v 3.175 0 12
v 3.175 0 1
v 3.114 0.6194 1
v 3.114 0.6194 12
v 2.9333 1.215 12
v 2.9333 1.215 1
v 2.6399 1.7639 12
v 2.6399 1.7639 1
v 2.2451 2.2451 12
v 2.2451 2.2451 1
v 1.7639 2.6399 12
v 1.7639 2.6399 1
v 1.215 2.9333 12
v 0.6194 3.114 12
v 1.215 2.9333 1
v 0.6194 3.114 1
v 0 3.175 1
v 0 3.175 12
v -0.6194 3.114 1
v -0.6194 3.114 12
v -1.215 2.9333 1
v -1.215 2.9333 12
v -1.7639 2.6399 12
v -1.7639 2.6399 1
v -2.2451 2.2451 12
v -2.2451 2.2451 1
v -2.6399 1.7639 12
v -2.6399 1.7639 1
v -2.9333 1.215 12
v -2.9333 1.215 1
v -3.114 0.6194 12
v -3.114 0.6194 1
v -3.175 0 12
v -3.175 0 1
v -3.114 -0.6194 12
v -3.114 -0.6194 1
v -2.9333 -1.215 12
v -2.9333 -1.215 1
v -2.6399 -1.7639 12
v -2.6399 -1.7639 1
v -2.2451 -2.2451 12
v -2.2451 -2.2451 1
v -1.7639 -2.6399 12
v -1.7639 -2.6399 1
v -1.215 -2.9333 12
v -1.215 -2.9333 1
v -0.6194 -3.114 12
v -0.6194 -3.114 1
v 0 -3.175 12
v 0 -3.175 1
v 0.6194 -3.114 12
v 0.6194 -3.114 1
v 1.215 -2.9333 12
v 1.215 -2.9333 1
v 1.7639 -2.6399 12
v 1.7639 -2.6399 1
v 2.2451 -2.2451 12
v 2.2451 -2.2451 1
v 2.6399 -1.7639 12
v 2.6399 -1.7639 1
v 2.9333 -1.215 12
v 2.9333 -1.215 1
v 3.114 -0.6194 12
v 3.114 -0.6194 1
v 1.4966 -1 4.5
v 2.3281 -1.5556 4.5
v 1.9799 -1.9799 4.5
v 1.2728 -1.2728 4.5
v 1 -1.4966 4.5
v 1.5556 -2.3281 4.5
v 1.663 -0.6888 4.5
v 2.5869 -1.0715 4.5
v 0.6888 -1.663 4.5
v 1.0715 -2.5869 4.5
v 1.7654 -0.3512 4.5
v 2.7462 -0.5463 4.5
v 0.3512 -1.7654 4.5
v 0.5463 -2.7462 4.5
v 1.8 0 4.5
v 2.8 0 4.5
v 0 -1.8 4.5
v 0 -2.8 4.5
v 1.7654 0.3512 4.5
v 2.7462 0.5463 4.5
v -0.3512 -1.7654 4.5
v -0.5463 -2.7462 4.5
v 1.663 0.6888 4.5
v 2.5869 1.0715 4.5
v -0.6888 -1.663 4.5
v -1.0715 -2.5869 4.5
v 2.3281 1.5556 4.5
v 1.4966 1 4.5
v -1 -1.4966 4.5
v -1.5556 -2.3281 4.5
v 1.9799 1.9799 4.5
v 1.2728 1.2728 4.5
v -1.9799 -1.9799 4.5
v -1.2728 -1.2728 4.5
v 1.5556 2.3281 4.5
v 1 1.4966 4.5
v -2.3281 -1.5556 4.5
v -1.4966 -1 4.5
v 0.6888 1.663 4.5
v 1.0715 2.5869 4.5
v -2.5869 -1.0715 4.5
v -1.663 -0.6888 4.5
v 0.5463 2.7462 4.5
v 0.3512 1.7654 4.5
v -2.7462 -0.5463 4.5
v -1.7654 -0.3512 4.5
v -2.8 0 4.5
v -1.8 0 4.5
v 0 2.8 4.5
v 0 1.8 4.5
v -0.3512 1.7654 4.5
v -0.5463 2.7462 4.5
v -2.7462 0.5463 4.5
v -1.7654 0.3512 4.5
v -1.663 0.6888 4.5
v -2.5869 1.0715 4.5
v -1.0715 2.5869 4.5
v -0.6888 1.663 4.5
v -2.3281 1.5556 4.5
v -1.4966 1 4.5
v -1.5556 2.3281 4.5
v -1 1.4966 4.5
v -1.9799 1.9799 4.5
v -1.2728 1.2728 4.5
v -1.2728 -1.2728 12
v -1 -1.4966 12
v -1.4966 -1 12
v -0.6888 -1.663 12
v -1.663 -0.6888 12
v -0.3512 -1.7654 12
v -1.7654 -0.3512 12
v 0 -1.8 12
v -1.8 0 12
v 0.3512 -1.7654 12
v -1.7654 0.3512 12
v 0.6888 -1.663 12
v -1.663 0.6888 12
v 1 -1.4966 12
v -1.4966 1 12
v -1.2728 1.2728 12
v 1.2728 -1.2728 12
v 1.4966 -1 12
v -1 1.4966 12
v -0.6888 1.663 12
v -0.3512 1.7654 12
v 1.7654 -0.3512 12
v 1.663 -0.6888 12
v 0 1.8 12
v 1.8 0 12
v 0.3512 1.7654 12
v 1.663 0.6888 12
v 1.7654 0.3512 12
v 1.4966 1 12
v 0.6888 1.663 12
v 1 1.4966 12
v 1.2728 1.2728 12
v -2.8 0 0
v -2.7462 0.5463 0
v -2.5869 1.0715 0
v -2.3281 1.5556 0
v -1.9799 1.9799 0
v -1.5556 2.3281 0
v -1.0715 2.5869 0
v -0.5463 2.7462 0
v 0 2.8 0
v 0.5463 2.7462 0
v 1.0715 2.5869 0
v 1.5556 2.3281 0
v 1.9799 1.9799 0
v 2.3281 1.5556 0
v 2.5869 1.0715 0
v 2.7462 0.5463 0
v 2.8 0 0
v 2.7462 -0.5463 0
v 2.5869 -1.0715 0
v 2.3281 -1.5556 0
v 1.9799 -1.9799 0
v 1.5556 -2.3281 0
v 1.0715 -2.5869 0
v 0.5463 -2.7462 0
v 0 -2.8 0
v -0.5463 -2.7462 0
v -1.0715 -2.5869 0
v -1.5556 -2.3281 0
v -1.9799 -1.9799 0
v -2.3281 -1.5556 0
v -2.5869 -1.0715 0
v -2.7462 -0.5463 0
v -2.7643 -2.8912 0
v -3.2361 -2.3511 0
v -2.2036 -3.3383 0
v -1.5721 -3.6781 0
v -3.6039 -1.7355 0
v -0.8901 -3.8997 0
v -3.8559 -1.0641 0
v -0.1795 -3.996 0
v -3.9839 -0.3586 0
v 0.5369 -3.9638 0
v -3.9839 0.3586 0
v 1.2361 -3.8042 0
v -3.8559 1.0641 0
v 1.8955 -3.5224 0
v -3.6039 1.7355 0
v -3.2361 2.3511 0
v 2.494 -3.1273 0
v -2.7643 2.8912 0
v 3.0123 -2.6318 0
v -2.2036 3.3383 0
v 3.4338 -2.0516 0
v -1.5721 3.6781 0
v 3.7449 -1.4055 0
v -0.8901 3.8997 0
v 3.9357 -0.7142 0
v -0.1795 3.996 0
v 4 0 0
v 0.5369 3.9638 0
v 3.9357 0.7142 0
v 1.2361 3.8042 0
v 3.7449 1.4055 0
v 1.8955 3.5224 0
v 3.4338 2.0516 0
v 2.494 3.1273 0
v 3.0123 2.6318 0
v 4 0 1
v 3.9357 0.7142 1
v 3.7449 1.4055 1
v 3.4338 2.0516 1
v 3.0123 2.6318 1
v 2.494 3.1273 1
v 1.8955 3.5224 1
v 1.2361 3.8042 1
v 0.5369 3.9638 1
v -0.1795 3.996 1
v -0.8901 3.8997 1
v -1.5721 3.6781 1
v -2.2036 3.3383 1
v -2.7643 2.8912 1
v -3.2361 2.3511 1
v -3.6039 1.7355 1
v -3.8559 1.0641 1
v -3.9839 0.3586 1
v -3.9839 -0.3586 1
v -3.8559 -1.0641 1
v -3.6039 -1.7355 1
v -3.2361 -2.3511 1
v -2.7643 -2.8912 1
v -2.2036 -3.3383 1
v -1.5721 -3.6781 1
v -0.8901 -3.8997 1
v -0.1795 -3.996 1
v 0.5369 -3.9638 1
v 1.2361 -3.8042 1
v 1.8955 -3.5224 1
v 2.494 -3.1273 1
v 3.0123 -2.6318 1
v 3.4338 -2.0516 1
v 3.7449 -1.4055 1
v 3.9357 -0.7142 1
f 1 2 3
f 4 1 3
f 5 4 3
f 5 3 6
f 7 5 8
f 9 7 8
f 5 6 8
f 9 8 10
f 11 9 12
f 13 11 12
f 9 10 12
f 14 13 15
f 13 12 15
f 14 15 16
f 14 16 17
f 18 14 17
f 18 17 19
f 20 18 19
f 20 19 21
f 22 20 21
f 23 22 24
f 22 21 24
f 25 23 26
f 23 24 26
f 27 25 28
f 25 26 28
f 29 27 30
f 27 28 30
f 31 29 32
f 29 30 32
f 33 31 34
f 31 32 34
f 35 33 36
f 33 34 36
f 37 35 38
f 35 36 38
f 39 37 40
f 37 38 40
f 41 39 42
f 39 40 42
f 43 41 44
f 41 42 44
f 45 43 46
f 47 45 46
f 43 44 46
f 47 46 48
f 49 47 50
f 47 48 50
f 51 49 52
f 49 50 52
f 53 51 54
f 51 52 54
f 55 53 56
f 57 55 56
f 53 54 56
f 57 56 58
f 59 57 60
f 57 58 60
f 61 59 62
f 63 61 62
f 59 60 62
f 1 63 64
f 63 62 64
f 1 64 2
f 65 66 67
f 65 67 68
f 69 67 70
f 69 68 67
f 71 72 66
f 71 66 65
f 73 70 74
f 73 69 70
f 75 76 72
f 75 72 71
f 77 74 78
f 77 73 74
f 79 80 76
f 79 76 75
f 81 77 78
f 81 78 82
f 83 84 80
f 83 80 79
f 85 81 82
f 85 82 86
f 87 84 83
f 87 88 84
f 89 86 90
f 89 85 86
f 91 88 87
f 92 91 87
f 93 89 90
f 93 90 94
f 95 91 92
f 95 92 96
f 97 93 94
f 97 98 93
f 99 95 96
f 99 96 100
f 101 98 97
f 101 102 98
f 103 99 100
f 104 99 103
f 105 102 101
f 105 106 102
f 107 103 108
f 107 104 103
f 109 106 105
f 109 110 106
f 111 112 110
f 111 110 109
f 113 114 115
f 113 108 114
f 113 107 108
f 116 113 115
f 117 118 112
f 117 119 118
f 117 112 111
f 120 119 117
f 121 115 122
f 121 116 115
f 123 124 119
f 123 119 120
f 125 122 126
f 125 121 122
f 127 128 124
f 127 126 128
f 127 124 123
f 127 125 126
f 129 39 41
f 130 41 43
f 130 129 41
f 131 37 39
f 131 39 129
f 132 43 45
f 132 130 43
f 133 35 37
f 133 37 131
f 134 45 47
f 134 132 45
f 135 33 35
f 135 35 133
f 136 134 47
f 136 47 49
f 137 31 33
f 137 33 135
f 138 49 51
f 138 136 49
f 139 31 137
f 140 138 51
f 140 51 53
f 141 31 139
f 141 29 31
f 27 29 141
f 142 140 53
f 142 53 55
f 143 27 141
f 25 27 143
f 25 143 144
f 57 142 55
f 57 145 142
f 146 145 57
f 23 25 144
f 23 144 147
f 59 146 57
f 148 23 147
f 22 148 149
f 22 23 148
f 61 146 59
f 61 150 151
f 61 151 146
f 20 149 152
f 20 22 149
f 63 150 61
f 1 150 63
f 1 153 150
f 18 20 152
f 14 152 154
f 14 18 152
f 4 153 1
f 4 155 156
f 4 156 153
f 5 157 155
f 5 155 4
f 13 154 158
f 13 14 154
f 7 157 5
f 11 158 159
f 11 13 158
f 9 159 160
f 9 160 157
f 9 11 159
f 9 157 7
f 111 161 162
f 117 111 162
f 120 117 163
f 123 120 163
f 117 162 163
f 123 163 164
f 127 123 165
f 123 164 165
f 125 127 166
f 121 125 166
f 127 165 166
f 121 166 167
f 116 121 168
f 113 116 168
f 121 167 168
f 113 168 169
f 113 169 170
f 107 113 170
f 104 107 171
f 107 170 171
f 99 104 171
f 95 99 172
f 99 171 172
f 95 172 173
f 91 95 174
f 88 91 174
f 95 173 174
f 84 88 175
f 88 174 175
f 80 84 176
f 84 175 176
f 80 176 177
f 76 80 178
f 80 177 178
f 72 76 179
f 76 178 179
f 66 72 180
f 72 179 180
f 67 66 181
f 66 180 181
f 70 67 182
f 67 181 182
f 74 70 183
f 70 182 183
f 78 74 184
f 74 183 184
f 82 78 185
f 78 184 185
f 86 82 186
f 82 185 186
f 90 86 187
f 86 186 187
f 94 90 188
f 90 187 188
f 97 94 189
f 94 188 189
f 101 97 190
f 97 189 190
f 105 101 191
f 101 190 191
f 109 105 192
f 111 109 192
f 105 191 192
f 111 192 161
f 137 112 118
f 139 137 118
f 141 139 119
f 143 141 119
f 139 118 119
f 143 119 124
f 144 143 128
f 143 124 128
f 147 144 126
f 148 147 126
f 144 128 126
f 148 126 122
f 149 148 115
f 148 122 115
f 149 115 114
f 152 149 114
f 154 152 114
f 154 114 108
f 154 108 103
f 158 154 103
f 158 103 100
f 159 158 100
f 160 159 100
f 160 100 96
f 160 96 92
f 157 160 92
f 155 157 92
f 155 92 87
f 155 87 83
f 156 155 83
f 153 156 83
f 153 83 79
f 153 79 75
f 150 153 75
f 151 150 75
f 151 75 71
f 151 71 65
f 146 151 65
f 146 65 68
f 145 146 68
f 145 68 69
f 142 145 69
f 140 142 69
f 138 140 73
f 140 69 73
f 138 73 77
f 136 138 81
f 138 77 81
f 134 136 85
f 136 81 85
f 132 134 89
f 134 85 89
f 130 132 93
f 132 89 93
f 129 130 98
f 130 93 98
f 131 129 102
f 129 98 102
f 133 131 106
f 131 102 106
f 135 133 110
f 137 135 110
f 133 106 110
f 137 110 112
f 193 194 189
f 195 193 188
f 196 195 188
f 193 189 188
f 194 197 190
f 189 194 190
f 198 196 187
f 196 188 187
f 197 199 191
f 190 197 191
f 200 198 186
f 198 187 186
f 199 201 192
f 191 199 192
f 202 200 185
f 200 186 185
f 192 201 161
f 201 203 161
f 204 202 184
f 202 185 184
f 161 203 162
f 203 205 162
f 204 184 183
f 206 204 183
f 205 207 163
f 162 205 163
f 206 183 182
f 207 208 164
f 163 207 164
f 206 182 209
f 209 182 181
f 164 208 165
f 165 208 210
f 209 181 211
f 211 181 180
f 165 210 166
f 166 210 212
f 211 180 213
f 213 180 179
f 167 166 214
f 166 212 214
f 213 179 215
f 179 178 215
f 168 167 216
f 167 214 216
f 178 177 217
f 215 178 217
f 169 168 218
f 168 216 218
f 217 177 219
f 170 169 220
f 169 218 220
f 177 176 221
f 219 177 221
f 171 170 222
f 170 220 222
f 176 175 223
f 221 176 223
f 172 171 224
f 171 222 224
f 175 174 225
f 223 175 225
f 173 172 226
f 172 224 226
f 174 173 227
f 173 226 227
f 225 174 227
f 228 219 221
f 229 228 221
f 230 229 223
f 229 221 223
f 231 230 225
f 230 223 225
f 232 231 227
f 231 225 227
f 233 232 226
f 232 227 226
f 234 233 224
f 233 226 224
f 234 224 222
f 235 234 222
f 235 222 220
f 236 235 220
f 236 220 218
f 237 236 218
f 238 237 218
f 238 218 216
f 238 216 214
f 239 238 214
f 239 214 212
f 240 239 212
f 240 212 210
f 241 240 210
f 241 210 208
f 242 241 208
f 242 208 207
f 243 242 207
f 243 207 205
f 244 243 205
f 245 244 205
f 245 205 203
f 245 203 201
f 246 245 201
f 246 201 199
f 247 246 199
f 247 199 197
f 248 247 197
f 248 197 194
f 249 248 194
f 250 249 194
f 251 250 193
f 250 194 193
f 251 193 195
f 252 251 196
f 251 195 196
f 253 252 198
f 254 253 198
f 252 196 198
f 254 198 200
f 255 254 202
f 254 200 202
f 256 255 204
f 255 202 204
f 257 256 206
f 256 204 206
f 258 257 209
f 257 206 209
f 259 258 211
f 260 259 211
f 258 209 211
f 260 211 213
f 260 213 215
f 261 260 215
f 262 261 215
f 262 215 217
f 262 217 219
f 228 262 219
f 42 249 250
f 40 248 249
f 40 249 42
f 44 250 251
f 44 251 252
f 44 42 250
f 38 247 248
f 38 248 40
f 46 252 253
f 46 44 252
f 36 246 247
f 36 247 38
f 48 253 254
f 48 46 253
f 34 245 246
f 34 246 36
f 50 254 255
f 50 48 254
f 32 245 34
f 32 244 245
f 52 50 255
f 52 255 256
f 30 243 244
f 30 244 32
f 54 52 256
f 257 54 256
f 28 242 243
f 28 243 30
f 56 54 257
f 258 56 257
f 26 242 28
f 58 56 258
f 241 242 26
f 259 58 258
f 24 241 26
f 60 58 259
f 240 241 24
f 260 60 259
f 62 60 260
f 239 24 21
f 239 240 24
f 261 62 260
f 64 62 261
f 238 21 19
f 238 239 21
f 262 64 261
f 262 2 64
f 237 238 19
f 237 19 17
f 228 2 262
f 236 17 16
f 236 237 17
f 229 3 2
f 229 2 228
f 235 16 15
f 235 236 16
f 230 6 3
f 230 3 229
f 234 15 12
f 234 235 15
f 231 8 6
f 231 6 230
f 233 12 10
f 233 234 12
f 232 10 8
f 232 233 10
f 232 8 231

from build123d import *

# Parameters (mm, degrees)
SKETCH1_R           = 4
BOSS_EXTRUDE1_DEPTH = 12
CUT_EXTRUDE1_START  = -11
SKETCH2_R           = 4
SKETCH2_R_2         = 3.175
CUT_EXTRUDE1_DEPTH  = 11
SKETCH5_R           = 1.8
CUT_EXTRUDE2_DEPTH  = 14.266499161
SKETCH6_R           = 2.8
CUT_EXTRUDE3_DEPTH  = 4.5


with BuildPart() as part:
    # Sketch1 → Boss-Extrude1 (new body)
    with BuildSketch(Plane.XY):
        Circle(SKETCH1_R)
    extrude(amount=BOSS_EXTRUDE1_DEPTH)

    # Sketch2 → Cut-Extrude1 (cut)
    with BuildSketch(Plane.XY.offset(12).offset(CUT_EXTRUDE1_START)):
        Circle(SKETCH2_R)
        Circle(SKETCH2_R_2, mode=Mode.SUBTRACT)
    extrude(amount=CUT_EXTRUDE1_DEPTH, mode=Mode.SUBTRACT)

    # Sketch5 → Cut-Extrude2 (cut, through all)
    with BuildSketch(Plane(origin=(0, 0, 0), x_dir=(-1, 0, 0), z_dir=(0, 0, -1))):
        Circle(SKETCH5_R)
    extrude(amount=-CUT_EXTRUDE2_DEPTH, mode=Mode.SUBTRACT)

    # Sketch6 → Cut-Extrude3 (cut)
    with BuildSketch(Plane(origin=(0, 0, 0), x_dir=(-1, 0, 0), z_dir=(0, 0, -1))):
        Circle(SKETCH6_R)
    extrude(amount=-CUT_EXTRUDE3_DEPTH, mode=Mode.SUBTRACT)


solid = part.part
